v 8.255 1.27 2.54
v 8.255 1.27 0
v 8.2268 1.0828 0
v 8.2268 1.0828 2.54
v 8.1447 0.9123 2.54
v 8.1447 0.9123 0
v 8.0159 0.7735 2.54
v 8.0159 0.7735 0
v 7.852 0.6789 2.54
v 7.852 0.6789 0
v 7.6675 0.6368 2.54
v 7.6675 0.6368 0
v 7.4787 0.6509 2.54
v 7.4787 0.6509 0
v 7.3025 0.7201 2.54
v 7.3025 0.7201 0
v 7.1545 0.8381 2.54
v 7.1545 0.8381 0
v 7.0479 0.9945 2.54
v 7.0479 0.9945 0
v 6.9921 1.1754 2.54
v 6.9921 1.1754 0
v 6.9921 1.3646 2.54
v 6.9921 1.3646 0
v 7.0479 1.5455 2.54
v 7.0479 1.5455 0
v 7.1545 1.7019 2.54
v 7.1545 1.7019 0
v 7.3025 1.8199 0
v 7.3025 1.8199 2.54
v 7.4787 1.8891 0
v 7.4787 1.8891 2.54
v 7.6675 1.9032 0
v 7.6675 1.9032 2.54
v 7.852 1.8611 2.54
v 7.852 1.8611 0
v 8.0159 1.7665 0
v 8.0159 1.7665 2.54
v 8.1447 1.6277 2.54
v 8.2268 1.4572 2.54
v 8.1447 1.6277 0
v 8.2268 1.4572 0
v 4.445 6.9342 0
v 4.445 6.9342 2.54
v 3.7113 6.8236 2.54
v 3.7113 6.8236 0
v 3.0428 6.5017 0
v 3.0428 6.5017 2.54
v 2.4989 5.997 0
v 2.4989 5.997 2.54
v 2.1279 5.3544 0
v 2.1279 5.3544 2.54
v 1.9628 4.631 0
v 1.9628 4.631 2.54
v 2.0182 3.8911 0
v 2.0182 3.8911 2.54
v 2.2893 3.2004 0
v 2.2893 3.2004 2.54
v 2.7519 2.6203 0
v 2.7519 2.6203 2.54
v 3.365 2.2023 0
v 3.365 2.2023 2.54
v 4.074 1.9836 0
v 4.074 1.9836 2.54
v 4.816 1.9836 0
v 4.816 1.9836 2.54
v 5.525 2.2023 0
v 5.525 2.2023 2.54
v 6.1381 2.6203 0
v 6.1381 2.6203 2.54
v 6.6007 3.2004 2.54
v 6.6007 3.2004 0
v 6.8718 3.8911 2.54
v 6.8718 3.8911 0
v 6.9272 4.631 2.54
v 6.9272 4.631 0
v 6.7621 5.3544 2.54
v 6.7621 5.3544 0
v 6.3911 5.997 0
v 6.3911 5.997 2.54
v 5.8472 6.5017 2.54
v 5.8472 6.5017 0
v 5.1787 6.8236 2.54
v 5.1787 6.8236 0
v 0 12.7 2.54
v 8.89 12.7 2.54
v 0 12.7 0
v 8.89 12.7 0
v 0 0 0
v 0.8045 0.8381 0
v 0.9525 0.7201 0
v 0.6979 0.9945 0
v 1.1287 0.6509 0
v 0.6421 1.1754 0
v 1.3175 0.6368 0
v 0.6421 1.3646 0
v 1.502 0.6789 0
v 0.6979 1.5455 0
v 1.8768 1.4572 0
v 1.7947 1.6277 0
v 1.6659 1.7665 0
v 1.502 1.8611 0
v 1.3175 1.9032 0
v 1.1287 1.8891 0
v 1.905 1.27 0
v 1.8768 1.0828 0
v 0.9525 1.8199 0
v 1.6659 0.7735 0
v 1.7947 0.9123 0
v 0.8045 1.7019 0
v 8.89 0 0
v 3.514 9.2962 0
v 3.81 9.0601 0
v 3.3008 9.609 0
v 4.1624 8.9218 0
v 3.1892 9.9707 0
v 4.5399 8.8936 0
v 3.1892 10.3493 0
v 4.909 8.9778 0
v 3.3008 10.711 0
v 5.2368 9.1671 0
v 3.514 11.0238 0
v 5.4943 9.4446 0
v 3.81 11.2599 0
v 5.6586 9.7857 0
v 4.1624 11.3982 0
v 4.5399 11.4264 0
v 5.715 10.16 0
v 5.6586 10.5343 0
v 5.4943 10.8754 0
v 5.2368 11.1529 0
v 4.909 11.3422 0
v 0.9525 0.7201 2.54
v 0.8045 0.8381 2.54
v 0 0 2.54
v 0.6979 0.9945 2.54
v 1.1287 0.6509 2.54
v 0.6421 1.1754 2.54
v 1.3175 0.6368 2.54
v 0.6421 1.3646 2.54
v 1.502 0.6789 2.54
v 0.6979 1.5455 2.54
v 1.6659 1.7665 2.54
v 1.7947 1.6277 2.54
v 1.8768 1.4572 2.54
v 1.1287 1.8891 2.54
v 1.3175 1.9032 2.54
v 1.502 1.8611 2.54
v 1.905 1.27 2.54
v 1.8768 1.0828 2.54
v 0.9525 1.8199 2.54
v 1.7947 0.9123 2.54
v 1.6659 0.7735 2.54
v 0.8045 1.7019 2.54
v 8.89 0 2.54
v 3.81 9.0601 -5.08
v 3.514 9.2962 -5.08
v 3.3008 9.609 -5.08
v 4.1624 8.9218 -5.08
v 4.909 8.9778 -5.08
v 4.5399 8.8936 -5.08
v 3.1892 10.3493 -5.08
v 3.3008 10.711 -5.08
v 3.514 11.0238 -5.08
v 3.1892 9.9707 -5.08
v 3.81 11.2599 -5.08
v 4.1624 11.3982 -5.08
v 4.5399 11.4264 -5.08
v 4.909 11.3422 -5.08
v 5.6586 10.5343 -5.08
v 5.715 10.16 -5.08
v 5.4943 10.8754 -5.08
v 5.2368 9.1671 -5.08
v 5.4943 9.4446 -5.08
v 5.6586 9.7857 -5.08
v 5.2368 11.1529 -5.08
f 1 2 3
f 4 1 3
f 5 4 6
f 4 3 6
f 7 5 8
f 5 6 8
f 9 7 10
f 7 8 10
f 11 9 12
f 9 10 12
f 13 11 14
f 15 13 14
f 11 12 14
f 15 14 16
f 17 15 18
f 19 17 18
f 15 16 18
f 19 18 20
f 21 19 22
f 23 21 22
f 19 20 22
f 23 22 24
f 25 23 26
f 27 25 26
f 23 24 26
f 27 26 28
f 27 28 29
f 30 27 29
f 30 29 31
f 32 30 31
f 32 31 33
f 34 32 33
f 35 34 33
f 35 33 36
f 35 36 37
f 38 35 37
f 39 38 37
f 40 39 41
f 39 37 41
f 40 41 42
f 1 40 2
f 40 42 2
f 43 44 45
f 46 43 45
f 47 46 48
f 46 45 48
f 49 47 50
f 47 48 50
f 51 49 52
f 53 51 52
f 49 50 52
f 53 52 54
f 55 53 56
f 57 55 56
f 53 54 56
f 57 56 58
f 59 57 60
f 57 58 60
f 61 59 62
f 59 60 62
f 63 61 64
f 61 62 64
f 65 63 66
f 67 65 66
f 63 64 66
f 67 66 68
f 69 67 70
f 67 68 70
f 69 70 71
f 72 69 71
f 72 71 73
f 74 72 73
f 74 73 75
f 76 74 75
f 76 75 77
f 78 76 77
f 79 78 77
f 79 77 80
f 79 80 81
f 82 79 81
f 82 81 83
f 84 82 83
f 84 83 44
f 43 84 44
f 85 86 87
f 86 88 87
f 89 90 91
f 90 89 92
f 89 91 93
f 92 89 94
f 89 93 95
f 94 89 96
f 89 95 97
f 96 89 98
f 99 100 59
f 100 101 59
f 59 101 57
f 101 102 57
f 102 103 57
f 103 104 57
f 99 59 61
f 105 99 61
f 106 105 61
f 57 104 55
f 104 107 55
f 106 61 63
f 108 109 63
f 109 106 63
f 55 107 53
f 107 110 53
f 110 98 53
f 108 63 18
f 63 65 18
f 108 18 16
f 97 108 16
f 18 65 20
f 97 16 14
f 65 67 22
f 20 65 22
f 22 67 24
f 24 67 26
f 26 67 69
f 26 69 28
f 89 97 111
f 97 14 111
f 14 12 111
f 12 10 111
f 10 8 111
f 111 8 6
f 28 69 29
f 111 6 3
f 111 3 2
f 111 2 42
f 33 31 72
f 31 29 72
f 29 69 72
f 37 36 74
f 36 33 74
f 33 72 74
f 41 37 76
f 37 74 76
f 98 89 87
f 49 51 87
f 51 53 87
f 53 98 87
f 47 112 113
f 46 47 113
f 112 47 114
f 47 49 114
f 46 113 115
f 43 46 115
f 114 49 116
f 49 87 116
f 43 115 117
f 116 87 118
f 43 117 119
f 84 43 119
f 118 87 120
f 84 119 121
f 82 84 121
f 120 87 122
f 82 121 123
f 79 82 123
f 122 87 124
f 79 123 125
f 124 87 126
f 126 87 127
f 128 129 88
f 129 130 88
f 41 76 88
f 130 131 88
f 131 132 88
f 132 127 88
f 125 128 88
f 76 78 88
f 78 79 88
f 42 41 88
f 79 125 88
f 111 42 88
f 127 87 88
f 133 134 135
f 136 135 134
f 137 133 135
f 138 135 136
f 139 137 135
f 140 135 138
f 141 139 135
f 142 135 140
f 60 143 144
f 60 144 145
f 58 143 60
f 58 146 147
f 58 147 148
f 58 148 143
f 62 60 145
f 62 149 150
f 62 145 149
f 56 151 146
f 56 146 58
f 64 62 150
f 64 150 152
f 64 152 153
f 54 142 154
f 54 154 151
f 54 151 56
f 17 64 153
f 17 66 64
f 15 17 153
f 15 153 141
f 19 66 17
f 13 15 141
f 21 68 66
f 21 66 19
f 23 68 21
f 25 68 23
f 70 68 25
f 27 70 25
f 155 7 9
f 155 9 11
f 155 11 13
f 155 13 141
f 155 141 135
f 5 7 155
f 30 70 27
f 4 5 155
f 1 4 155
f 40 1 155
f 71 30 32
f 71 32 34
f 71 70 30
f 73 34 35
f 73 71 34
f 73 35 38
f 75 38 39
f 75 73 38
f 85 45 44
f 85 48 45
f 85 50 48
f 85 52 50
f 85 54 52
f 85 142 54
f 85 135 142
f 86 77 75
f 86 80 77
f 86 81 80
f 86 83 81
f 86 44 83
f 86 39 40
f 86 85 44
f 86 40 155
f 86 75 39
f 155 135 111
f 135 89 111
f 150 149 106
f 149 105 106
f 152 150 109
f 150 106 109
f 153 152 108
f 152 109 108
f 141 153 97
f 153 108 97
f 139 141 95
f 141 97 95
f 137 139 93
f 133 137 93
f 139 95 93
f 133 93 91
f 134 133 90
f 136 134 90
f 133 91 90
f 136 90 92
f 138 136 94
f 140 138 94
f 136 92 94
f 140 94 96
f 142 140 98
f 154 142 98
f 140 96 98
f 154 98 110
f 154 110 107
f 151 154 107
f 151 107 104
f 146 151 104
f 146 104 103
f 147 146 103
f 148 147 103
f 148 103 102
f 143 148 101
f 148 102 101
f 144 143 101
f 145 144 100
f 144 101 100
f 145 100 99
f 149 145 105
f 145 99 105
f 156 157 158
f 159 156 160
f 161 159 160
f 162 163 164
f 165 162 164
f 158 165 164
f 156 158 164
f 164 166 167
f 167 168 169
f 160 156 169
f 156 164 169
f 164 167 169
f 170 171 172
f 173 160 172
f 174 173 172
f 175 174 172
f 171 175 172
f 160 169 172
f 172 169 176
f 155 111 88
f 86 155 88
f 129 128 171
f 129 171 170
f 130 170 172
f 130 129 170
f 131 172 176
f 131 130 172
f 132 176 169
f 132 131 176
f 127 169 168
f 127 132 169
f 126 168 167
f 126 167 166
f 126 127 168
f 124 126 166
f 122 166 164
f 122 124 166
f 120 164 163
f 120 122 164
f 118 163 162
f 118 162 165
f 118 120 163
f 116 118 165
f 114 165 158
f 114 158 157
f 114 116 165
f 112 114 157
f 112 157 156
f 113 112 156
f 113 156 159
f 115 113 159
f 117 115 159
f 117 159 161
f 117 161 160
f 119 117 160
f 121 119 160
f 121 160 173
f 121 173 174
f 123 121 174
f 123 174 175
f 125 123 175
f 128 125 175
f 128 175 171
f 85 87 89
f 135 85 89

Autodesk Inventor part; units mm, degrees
ref_plane "YZ Plane" through (0, 0, 0) normal (1, 0, 0) x (0, 1, 0)
ref_plane "XZ Plane" through (0, 0, 0) normal (0, 1, 0) x (-1, 0, 0)
ref_plane "XY Plane" through (0, 0, 0) normal (0, 0, 1) x (1, 0, 0)
sketch "Sketch1" plane through (0, 0, 0) normal (0, 0, 1) x (1, 0, 0)
  line L0 (0, 0) -> (8.89, 0)
  line L1 (8.89, 0) -> (8.89, 12.7)
  line L2 (8.89, 12.7) -> (0, 12.7)
  line L3 (0, 12.7) -> (0, 0)
  circle A0 centre (7.62, 1.27) radius 0.635
  circle A1 centre (1.27, 1.27) radius 0.635
  point P0 (4.445, 4.445)
  dimension "d0" = 8.89
  dimension "d1" = 12.7
  dimension "d18" = 1.27
  dimension "d19" = 1.27
  dimension "d20" = 1.27
  dimension "d21" = 1.27
  dimension "d22" = 1.27
  dimension "d23" = 1.27
  dimension "d26" = 4.445
extrude "Extrusion1" add sketch "Sketch1" along normal blind 2.54 contours L3 L2 L1 L0 | A0 | A1
sketch "Sketch2" plane through (0, 0, 2.54) normal (0, 0, 1) x (1, 0, 0)
  circle A0 centre (4.445, 10.16) radius 1.27
  line L0 (8.89, 12.7) -> (0, 12.7) projected
  line L1 (8.89, 0) -> (8.89, 12.7) projected
  point P0 (0, 0)
  dimension "d5" = 2.54
  dimension "d6" = 2.54
  dimension "d7" = 4.445
extrude "Extrusion2" add sketch "Sketch2" against normal blind 7.62
hole "Hole1" at (4.445, 4.445, 0) direction (0, 0, 1) diameter 4.9784 depth 19.05 tip angle 118 thread size "1/4-20 UNC" class "2B" standard "ANSI Unified Screw Threads"
extrude "Extrusion3" cut sketch "Sketch1" along normal blind 5.08 contours A0 | A1
properties part number "Slider"
